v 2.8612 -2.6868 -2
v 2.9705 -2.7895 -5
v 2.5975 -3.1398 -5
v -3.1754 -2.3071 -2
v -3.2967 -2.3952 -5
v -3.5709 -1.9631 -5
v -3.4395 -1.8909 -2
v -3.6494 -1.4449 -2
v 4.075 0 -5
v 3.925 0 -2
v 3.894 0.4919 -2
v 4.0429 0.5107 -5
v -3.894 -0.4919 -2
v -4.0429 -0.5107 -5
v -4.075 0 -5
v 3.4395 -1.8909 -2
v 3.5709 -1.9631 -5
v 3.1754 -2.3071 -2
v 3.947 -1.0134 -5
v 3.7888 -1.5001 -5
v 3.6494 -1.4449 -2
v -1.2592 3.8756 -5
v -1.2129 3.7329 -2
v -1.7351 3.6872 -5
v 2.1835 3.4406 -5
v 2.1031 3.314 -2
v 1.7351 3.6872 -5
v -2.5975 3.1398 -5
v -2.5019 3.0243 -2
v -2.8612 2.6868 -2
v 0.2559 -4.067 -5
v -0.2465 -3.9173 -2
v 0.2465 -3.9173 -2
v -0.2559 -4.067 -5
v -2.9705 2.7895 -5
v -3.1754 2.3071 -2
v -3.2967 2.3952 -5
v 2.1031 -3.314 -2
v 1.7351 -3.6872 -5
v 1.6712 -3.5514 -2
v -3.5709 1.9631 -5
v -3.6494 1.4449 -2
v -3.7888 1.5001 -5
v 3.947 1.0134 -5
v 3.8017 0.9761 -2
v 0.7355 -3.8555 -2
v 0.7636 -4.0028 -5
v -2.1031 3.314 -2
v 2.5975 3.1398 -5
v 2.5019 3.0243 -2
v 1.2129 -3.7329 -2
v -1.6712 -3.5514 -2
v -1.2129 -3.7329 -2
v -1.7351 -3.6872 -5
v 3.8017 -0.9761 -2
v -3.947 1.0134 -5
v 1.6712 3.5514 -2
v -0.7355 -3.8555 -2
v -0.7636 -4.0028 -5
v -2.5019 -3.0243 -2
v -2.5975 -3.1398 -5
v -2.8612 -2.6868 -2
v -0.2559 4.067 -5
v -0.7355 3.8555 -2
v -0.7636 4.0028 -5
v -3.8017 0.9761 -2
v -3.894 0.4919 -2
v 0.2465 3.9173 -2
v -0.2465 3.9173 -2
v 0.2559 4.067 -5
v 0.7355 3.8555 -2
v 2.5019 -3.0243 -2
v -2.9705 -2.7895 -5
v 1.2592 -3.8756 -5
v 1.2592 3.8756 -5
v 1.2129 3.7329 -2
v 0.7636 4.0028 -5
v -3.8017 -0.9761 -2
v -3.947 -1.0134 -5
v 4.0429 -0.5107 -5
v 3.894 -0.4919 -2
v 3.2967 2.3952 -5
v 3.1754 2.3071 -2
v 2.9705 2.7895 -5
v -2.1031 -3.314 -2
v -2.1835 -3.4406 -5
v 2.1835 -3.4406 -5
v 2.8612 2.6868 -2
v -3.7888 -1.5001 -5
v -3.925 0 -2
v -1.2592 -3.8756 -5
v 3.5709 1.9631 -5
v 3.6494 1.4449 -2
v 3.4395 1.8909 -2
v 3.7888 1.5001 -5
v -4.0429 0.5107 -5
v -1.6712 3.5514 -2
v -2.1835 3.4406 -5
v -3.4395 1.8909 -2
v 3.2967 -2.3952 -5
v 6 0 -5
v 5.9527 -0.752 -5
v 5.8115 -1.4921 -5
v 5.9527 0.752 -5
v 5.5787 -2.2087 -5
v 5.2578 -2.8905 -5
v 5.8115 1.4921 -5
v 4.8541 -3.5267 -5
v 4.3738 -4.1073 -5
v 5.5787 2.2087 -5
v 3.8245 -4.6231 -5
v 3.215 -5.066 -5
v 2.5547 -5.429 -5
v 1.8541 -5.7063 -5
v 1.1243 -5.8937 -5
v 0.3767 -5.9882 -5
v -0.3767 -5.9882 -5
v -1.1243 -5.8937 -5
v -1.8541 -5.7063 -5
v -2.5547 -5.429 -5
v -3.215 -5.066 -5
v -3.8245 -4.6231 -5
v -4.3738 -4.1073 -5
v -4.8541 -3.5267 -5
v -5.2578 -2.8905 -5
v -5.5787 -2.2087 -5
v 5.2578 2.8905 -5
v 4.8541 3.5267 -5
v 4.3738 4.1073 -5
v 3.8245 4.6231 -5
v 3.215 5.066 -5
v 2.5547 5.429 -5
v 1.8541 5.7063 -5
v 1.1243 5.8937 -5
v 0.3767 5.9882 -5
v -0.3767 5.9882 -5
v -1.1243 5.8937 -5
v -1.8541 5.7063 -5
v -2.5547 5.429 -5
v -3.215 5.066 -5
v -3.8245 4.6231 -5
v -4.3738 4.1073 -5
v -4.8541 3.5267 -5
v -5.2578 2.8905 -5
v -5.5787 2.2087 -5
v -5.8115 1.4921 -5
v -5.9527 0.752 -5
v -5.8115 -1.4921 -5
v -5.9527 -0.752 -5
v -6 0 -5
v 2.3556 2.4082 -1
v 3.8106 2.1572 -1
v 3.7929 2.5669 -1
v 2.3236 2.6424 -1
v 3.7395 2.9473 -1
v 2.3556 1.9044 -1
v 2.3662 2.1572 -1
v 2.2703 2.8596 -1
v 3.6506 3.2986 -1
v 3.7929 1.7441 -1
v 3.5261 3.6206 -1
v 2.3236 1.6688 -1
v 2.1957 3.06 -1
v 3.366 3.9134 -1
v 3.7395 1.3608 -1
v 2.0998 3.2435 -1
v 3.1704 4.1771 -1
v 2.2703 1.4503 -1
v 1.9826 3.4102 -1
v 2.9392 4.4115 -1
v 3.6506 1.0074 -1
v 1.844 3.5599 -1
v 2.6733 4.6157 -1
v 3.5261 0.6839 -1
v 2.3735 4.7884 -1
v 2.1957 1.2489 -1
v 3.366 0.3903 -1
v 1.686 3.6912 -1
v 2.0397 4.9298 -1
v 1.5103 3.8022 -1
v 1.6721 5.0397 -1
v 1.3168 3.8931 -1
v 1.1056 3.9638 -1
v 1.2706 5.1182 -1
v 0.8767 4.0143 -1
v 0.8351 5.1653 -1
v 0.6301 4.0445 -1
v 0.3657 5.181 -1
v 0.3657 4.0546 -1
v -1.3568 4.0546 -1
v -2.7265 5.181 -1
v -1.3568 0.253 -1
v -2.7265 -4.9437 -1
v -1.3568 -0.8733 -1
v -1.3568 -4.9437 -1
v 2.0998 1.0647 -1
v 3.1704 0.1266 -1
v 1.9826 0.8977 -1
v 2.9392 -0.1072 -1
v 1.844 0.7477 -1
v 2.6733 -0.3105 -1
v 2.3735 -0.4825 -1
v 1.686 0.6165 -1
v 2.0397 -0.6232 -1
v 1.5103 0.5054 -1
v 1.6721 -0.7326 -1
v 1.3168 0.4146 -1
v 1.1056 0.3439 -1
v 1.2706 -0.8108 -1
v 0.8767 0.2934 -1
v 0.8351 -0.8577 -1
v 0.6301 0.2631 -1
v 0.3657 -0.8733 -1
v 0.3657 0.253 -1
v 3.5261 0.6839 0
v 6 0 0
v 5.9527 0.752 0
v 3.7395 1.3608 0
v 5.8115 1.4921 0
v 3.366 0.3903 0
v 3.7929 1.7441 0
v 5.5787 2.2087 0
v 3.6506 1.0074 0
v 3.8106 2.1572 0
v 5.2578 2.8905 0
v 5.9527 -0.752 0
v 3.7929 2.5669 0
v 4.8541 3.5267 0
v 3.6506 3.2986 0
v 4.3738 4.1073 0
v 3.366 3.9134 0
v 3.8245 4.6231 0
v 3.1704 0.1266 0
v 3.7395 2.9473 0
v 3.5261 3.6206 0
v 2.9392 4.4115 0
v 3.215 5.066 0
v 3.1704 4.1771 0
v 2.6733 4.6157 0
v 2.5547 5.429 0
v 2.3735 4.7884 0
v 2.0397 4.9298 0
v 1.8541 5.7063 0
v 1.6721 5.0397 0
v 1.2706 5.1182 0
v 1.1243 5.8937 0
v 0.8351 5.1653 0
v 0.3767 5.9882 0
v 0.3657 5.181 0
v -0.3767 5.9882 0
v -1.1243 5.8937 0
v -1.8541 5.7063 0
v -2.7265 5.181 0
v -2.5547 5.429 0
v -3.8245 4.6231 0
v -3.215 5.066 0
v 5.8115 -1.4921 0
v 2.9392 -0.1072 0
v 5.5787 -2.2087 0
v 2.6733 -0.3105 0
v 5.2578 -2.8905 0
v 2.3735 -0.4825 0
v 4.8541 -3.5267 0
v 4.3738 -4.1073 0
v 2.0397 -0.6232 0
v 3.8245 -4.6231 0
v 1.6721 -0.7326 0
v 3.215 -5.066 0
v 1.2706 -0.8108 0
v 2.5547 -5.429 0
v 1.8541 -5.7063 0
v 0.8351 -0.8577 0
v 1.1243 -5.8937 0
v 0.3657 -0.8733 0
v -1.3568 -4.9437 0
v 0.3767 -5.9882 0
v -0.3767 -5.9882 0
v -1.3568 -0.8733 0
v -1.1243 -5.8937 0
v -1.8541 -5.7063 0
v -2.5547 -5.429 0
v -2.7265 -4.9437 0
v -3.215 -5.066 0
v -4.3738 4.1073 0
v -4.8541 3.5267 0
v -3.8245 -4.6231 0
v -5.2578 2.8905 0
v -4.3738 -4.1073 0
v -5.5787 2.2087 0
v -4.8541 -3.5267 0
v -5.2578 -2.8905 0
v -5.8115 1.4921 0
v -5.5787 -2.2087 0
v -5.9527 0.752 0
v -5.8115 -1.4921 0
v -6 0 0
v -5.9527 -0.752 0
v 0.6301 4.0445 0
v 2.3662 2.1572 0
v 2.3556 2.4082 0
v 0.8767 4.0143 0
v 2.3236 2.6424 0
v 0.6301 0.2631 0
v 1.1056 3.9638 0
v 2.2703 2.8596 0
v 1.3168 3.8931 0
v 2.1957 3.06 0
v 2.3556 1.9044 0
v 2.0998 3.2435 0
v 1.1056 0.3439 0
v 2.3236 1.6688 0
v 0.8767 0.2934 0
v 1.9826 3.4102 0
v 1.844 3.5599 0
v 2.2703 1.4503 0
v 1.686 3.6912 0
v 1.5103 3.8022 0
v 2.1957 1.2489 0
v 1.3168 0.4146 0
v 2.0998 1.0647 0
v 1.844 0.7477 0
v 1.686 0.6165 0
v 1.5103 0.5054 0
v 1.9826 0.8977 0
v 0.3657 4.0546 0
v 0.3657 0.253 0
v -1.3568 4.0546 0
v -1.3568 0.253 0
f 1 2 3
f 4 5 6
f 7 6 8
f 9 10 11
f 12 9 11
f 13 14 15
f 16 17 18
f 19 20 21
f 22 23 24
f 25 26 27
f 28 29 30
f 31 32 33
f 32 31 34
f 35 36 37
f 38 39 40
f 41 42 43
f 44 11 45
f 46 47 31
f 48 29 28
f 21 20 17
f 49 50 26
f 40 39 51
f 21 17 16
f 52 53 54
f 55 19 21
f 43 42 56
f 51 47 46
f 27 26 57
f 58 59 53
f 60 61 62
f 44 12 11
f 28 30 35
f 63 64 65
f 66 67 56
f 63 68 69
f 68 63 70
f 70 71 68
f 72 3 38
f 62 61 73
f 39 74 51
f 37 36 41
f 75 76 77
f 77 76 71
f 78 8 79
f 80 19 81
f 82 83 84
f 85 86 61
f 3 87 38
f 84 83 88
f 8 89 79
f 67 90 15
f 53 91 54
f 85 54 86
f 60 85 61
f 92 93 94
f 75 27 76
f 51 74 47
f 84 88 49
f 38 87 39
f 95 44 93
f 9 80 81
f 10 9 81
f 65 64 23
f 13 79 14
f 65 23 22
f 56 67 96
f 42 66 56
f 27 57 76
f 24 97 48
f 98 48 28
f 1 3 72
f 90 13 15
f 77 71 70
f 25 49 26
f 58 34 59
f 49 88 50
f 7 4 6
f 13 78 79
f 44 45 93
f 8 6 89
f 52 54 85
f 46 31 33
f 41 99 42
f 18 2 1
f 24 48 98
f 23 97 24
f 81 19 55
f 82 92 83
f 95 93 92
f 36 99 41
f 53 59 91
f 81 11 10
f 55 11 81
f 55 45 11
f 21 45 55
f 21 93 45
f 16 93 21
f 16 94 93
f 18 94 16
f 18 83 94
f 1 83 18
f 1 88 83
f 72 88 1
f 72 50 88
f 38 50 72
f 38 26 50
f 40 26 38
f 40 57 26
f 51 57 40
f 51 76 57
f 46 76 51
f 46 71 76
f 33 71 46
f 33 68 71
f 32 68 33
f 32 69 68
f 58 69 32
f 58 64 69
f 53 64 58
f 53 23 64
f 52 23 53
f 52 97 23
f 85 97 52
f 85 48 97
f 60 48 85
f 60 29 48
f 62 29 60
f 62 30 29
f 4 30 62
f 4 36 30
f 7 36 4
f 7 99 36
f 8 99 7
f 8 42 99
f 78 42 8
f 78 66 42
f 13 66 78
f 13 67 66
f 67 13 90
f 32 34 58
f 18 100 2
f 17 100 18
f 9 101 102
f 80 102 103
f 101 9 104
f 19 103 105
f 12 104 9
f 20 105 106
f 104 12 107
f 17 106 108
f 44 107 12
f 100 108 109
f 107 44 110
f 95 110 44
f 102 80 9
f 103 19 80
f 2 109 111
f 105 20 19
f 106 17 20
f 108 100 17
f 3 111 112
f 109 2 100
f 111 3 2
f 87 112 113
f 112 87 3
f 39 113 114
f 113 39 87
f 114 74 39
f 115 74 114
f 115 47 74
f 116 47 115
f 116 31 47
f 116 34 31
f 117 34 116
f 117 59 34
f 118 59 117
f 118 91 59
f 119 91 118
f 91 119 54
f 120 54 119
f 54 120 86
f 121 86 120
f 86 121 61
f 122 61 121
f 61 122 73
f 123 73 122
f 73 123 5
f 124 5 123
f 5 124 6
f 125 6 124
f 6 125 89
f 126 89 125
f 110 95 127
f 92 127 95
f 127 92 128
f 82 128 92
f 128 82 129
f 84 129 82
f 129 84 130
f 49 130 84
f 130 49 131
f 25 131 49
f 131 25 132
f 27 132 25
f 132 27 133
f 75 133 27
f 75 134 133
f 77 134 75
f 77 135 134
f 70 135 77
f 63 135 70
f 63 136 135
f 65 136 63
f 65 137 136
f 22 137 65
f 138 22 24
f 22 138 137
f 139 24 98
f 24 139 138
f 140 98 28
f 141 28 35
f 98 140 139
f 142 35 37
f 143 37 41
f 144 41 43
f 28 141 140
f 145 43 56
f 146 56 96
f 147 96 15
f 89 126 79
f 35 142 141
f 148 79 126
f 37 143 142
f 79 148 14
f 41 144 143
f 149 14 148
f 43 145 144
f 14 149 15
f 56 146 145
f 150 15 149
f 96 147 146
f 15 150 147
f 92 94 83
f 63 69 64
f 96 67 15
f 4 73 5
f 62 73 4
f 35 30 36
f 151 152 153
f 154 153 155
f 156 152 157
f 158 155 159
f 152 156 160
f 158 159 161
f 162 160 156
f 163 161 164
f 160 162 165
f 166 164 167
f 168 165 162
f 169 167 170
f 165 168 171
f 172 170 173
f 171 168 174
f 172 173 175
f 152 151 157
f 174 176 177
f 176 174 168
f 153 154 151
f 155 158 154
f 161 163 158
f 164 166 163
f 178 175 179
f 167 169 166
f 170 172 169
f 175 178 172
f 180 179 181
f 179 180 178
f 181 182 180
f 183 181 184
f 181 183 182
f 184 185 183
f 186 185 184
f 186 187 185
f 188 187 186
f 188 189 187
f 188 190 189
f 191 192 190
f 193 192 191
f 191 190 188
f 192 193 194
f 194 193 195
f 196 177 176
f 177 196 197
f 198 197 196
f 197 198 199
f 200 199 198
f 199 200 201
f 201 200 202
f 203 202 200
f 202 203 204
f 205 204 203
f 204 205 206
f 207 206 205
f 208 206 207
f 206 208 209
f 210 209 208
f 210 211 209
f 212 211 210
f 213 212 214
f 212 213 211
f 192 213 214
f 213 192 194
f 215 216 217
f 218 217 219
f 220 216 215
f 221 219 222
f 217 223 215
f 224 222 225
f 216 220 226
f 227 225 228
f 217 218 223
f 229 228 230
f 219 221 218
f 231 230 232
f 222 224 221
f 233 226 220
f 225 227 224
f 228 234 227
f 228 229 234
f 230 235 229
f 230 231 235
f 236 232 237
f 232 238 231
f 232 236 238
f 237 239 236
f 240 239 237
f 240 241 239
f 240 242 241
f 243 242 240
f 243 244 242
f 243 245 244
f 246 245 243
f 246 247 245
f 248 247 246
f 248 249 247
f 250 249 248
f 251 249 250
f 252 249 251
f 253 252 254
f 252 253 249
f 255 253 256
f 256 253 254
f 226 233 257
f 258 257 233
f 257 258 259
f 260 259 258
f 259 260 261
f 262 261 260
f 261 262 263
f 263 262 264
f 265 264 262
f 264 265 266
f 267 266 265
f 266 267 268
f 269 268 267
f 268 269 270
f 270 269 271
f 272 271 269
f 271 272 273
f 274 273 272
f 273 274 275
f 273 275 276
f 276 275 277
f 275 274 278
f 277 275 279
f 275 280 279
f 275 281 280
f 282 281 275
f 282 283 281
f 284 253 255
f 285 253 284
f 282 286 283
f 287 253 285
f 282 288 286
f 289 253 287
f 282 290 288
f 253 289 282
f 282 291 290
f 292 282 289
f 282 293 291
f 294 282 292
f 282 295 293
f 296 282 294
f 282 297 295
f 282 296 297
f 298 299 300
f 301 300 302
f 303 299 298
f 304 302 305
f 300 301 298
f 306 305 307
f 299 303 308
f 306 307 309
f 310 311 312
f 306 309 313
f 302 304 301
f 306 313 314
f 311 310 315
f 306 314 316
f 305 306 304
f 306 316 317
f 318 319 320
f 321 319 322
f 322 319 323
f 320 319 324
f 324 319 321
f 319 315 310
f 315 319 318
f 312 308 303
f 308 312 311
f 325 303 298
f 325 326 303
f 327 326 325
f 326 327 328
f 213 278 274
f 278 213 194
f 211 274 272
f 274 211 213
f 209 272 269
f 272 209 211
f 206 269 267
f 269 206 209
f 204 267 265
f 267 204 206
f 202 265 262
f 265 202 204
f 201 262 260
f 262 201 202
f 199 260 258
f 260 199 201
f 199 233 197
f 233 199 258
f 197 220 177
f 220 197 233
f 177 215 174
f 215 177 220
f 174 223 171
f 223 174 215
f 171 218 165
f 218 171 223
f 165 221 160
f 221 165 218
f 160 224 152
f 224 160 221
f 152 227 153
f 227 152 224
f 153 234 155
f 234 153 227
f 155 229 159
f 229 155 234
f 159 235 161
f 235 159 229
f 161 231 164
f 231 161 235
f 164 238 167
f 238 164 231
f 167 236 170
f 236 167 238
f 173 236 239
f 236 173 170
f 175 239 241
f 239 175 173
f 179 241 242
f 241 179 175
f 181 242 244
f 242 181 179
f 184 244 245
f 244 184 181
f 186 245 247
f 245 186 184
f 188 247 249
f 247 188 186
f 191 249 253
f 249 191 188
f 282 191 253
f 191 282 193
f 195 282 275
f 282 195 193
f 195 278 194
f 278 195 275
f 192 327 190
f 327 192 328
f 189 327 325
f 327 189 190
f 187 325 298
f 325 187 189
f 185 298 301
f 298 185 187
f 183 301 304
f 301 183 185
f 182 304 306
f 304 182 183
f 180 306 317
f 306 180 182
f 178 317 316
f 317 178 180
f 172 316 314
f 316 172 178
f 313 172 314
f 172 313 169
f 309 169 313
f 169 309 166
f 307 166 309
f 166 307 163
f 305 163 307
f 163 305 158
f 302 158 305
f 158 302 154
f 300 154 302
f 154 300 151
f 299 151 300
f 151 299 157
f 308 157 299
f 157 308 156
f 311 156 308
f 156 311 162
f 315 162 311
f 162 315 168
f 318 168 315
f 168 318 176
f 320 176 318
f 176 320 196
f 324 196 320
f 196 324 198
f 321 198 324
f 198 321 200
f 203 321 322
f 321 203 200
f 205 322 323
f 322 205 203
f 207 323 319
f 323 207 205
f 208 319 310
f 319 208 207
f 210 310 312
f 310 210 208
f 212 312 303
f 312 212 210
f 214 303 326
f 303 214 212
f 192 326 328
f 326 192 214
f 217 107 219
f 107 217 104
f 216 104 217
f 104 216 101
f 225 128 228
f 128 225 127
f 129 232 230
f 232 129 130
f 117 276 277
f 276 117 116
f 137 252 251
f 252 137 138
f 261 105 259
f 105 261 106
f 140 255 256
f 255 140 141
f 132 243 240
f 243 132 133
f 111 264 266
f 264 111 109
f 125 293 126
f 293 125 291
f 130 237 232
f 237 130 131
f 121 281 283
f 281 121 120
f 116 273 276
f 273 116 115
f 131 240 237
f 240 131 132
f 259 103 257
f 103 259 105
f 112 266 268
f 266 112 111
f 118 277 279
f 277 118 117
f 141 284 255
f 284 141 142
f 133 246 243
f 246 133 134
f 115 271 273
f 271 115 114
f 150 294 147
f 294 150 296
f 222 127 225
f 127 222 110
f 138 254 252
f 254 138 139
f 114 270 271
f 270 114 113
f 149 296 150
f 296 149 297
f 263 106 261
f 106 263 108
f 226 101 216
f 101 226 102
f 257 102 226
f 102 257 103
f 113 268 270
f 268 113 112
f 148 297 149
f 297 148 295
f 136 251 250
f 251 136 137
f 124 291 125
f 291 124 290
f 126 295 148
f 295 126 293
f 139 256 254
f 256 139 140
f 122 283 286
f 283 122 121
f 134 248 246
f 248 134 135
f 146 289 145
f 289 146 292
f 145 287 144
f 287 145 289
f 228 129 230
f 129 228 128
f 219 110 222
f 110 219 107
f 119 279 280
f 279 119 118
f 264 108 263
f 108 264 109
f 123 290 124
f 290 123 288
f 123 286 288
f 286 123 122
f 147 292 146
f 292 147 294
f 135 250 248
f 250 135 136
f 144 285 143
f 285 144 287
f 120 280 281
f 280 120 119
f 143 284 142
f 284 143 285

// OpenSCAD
$fn = 50;

difference() {
	union() {
		translate(v = [0, 0, -5.0]) {
			cylinder(h = 5, r = 6.0);
		}
	}
	union() {
		#translate(v = [0, 0, -5.0]) {
			cylinder(h = 3, r1 = 4.075, r2 = 3.925);
		}
		translate(v = [0, 0, -1]) {
			linear_extrude(height = 1) {
				text(font = "Impact", halign = "center", size = 10, text = "P", valign = "center");
			}
		}
	}
}
